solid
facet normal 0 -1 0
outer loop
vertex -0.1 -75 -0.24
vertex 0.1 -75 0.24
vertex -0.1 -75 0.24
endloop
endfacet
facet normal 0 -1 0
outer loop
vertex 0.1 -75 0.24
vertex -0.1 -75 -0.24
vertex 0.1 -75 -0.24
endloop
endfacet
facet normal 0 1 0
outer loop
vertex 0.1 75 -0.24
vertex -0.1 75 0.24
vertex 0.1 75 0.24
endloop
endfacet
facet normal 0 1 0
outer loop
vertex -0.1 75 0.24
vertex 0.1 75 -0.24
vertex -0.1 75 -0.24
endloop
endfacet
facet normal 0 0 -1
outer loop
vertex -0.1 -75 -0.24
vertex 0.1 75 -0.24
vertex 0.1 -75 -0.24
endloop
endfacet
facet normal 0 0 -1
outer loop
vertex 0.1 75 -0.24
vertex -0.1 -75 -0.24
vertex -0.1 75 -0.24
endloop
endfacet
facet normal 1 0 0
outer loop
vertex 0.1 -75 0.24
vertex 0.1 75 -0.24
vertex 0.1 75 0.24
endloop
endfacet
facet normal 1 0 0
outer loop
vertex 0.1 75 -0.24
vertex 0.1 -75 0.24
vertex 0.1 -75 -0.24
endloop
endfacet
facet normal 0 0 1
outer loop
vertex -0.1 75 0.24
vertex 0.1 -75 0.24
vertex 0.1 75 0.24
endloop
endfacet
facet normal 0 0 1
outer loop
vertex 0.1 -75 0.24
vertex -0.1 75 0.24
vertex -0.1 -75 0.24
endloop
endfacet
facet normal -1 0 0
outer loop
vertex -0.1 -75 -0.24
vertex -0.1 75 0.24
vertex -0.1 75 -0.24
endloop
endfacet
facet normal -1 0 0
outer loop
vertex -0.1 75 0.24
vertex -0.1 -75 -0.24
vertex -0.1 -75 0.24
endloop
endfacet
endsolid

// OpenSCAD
length=150;
width=0.48;
height=0.2;


rotate(a=90, v=[1,0,0]) cube([height,width,length], center=true);
